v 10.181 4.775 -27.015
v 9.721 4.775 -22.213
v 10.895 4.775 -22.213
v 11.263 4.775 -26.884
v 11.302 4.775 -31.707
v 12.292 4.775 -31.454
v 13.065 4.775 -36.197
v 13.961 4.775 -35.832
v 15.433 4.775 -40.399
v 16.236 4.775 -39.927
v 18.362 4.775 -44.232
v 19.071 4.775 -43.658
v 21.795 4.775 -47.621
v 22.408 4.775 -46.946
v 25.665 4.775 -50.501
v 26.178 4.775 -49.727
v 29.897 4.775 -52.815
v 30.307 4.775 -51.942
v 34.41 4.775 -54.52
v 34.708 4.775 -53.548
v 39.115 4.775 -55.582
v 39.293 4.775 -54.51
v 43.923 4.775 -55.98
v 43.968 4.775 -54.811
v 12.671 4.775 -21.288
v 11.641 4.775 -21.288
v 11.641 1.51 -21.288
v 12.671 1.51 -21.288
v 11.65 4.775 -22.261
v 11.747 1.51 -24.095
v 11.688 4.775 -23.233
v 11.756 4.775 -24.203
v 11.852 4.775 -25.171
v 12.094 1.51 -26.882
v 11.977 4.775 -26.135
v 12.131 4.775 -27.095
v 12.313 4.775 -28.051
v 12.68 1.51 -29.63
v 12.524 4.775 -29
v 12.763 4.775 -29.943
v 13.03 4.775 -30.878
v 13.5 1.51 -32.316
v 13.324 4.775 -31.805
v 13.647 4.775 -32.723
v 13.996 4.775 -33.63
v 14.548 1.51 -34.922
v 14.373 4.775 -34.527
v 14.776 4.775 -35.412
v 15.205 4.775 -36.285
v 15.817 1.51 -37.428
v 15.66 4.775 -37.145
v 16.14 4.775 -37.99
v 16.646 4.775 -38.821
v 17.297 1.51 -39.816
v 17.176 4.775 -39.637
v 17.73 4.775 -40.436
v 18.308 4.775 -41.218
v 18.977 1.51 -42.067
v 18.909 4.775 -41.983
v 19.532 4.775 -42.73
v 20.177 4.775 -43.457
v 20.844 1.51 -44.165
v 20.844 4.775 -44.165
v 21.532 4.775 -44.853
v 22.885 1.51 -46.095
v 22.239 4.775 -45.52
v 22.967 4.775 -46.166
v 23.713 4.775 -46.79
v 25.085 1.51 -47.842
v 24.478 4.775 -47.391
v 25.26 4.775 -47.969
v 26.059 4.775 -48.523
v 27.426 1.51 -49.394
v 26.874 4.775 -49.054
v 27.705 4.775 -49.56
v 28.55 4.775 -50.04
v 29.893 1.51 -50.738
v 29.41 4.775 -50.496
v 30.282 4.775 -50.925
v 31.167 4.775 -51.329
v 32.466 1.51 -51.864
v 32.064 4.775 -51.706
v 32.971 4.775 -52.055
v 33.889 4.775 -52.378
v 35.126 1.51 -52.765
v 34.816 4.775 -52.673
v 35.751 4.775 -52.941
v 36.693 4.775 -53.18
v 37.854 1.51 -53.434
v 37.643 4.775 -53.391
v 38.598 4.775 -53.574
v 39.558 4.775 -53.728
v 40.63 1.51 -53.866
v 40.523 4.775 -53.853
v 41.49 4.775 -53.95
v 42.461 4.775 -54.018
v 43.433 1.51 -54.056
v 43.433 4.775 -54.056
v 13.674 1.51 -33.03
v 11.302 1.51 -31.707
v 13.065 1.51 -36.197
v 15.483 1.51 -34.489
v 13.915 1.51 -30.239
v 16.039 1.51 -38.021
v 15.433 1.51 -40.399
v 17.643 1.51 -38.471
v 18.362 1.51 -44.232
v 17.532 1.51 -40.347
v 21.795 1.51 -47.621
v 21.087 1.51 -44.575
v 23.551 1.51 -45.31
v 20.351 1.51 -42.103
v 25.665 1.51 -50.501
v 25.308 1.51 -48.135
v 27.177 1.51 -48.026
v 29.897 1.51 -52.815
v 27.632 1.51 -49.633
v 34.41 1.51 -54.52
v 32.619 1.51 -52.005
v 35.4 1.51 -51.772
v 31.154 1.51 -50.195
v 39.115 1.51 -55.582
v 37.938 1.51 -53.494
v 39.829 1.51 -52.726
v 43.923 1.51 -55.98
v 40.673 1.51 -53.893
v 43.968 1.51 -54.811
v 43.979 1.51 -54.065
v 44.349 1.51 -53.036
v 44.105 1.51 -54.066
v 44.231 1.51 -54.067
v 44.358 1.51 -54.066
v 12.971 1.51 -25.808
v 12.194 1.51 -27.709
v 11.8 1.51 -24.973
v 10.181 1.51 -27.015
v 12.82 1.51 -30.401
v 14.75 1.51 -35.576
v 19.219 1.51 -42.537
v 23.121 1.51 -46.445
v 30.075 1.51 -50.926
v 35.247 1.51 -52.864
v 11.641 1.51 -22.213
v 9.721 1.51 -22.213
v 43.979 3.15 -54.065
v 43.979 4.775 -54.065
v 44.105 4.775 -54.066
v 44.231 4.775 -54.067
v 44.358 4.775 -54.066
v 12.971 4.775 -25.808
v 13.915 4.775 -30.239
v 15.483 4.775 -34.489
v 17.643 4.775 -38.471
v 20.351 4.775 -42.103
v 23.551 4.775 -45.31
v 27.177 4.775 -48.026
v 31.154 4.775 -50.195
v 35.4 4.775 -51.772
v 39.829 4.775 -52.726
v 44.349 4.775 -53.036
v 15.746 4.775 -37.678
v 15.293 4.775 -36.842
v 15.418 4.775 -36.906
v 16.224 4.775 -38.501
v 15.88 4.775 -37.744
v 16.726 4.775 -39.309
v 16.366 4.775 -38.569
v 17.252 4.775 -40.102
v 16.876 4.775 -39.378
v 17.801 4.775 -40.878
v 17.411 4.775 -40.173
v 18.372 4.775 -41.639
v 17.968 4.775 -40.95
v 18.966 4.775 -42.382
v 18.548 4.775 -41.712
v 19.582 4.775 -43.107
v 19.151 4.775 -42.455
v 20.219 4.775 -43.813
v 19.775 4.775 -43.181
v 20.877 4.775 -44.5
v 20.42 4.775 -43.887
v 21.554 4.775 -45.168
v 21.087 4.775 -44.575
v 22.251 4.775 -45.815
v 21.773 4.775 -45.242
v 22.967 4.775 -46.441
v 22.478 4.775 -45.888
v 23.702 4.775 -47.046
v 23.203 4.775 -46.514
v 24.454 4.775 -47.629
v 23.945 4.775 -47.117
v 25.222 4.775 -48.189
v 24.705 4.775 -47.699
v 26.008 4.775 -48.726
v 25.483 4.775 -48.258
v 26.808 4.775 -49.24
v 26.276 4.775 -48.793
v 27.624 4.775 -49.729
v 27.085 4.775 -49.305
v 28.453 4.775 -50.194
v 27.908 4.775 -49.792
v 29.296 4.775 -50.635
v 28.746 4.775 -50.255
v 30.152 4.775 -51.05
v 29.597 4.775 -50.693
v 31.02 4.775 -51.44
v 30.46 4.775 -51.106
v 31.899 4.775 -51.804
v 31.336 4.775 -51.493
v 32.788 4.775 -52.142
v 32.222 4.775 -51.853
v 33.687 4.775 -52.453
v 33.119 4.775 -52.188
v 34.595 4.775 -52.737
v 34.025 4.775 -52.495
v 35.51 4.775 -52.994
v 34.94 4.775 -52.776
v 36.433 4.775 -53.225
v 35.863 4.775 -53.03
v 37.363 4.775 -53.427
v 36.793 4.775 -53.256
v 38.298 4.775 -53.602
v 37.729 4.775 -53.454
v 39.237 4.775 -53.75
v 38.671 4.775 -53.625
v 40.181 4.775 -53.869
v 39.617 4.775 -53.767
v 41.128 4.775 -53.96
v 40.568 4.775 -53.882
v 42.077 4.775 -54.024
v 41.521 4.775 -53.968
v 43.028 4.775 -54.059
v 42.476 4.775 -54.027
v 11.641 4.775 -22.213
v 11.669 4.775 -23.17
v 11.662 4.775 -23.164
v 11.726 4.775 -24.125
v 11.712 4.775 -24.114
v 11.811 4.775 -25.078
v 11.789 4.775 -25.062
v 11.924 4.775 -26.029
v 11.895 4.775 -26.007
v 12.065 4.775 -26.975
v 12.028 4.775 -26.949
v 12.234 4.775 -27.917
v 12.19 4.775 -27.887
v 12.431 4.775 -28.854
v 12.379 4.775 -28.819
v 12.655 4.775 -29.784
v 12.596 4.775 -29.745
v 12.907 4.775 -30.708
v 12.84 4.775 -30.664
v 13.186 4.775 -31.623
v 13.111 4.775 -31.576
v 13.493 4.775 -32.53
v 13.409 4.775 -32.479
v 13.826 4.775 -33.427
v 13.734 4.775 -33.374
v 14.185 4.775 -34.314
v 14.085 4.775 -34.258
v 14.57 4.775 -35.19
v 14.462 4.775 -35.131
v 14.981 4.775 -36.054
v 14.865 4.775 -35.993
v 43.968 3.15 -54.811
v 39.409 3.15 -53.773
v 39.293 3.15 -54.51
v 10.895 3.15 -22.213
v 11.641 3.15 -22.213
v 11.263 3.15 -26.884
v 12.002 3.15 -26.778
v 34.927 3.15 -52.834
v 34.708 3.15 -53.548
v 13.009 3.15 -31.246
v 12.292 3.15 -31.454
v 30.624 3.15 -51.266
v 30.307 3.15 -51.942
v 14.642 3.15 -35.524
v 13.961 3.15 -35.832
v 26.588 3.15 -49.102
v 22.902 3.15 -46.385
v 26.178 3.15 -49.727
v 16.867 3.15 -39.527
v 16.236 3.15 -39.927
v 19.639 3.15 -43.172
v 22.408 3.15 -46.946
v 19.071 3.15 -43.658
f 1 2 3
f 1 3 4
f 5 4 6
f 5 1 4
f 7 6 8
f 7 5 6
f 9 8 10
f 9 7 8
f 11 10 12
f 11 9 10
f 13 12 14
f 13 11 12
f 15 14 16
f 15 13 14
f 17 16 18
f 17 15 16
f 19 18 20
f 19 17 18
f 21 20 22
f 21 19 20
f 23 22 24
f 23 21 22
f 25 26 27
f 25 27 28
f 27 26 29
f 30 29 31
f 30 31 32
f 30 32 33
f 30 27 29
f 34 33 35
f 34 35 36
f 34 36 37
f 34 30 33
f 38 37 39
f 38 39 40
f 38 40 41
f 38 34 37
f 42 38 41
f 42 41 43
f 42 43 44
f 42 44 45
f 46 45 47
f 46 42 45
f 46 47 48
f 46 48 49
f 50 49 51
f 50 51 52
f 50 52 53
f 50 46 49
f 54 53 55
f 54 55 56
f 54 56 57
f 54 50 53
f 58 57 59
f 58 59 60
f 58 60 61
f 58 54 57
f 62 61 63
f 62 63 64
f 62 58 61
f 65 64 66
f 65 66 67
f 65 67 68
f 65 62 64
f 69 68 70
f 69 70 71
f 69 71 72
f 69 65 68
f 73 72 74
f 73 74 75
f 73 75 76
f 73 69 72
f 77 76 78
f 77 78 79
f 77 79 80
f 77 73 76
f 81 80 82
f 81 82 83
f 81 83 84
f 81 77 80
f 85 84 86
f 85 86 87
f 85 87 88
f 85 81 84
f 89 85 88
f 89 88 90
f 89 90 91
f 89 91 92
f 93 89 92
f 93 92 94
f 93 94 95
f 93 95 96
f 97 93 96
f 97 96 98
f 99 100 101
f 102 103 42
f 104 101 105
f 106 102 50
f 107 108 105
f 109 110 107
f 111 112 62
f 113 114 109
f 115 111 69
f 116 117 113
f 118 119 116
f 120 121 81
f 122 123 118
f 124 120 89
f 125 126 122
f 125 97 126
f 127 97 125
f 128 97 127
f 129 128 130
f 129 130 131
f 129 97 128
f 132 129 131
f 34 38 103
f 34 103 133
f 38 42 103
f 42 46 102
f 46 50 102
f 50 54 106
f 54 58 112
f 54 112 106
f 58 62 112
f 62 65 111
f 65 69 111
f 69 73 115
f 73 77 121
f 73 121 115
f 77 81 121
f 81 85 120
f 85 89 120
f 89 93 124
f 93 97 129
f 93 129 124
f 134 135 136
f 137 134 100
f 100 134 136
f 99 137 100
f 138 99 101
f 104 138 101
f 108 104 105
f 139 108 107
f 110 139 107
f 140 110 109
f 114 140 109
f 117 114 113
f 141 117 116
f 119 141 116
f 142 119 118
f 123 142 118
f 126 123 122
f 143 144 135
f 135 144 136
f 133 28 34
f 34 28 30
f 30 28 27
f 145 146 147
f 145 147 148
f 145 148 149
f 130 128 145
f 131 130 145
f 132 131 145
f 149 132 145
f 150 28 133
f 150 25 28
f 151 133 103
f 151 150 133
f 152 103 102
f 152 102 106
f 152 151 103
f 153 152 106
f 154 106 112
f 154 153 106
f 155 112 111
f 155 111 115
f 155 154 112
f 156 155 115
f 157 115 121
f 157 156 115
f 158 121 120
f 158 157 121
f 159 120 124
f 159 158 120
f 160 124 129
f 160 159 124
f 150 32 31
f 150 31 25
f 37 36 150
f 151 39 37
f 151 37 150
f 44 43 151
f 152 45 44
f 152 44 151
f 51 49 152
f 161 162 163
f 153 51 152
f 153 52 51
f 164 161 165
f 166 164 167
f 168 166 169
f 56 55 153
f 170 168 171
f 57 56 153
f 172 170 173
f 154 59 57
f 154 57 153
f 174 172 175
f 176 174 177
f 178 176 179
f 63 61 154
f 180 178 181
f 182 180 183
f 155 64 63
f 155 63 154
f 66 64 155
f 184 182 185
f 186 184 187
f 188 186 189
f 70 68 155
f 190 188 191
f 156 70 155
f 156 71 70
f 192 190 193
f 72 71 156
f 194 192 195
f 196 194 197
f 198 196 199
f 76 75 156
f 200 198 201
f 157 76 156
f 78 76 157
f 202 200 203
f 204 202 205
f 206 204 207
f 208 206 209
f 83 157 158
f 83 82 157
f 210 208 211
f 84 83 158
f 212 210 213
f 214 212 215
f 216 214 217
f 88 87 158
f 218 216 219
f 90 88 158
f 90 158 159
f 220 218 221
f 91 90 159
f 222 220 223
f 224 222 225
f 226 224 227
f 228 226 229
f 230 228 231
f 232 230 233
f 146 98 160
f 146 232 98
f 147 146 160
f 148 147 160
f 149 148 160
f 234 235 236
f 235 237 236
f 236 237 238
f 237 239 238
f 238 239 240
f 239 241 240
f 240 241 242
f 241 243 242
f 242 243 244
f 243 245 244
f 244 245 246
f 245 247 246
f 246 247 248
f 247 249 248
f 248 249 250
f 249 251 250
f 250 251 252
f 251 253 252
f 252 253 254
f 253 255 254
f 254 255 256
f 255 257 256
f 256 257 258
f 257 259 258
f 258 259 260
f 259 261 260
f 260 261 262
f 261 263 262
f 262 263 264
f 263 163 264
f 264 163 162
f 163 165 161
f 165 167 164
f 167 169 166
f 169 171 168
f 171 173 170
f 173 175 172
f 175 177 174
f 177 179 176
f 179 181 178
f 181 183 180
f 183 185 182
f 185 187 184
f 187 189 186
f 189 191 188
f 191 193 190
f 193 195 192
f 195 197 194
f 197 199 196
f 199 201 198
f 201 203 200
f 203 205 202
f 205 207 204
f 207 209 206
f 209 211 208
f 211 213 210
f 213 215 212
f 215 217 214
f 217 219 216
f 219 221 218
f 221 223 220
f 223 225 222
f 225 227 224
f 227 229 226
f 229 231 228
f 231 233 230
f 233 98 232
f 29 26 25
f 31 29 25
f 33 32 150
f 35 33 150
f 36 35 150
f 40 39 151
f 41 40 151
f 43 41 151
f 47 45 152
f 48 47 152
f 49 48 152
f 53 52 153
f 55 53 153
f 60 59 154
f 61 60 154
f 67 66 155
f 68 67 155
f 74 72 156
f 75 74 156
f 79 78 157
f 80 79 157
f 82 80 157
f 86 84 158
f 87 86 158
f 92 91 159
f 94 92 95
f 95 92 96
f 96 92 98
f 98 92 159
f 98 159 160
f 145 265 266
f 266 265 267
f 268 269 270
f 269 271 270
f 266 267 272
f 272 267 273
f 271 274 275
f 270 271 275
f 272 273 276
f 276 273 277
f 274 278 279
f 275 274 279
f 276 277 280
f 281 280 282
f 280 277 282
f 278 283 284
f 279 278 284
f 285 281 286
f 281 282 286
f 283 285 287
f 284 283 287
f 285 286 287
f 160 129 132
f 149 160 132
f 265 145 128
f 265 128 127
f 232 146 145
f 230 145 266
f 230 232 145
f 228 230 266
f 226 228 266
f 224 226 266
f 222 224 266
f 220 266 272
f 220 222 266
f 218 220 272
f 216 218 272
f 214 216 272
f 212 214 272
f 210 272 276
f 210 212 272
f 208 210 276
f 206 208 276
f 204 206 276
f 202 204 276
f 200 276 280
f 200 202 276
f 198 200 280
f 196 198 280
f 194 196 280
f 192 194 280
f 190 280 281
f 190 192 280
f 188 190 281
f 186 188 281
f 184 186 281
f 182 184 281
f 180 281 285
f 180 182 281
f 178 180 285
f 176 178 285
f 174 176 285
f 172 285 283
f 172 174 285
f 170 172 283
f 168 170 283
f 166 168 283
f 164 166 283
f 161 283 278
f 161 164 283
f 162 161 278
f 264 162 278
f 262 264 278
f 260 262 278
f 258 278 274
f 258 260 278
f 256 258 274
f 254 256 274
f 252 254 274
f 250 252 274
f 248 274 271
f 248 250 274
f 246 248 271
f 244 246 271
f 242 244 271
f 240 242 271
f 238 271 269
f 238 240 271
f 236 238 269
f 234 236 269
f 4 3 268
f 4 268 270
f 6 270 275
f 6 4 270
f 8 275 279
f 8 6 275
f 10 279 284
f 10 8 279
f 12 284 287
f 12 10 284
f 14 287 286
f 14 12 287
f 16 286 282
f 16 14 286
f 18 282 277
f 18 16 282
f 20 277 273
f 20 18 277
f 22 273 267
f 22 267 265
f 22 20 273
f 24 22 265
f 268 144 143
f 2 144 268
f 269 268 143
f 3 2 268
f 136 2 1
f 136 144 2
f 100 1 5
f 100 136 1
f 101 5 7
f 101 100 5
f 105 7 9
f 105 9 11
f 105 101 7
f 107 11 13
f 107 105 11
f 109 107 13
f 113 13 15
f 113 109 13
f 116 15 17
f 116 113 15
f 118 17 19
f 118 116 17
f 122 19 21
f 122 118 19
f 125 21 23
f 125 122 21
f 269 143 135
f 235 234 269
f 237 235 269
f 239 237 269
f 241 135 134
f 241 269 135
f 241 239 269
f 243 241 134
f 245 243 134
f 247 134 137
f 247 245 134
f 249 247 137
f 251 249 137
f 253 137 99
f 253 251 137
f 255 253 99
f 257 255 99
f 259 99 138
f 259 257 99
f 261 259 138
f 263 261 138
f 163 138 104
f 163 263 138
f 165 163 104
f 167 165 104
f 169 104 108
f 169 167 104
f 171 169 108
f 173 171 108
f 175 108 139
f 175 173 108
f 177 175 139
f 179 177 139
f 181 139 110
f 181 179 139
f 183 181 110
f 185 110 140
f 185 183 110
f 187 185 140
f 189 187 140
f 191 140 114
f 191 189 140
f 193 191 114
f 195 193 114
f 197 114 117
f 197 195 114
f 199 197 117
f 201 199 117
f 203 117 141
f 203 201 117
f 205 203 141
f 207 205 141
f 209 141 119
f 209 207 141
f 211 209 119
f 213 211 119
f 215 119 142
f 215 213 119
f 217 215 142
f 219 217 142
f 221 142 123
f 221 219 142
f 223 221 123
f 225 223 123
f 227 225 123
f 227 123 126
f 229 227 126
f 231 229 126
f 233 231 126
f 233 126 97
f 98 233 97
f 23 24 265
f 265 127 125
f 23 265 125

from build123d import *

# Parameters (mm, degrees)
SKETCH1_W          = 2.06
SKETCH1_H          = 6.53
SKETCH3_W          = 1.5
SKETCH3_H          = 6.53
SKETCH6_W          = 2.34
SKETCH6_H          = 6.53
CUT_EXTRUDE1_DEPTH = 3.25
SCALE1_SCALE       = 0.5


with BuildPart() as part:
    # Sweep1: sweep along a path in Sketch2
    with BuildLine(Plane(origin=(0, 0, 0), x_dir=(1, 0, 0), z_dir=(0, 1, 0))) as sweep1_path:
        ThreePointArc((2.06, 0), (20.505721927, 44.951087367), (65.415754098, 63.496542965))
    # Sketch1 → Sweep1 (sweep)
    with BuildSketch(Plane.XY):
        with Locations((1.03, 3.265)):
            Rectangle(SKETCH1_W, SKETCH1_H)
    sweep(path=sweep1_path.line)

    # Sweep2: sweep along a path in Sketch4
    with BuildLine(Plane(origin=(0, 0, 0), x_dir=(1, 0, 0), z_dir=(0, 1, 0))) as sweep2_path:
        ThreePointArc((-2.34, 1.85), (17.612800495, 48.600532533), (64.642950035, 67.885023038))
    # Sketch3 → Sweep2 (sweep)
    with BuildSketch(Plane.XY.offset(-1.85)):
        with Locations((-0.75, 3.265)):
            Rectangle(SKETCH3_W, SKETCH3_H)
    sweep(path=sweep2_path.line)

    # Sweep3: sweep along a path in Sketch7
    with BuildLine(Plane(origin=(0, 6.53, 0), x_dir=(1, 0, 0), z_dir=(0, 1, 0))) as sweep3_path:
        ThreePointArc((-1.5, 1.85), (18.444326424, 47.774036761), (64.654921624, 67.045108351))
    # Sketch6 → Sweep3 (sweep)
    with BuildSketch(Plane.XY.offset(-1.85)):
        with Locations((-2.67, 3.265)):
            Rectangle(SKETCH6_W, SKETCH6_H)
    sweep(path=sweep3_path.line)

    # Sketch8 → Cut-Extrude1 (cut)
    with BuildSketch(Plane(origin=(0, 6.53, 0), x_dir=(1, 0, 0), z_dir=(0, 1, 0))):
        with BuildLine():
            Line((0, 1.85), (-1.4905859, 1.85))
            ThreePointArc((-1.4905859, 1.85), (18.079818822, 48.146737329), (64.654921624, 67.045108351))
            Line((64.654921624, 67.045108351), (64.676165293, 65.554673837))
            ThreePointArc((64.676165293, 65.554673837), (19.144412702, 47.097209332), (0, 1.85))
        make_face()
    extrude(amount=-CUT_EXTRUDE1_DEPTH, mode=Mode.SUBTRACT)


with BuildPart() as part_1:
    # Scale1: scaled about (23.281504141, 3.019990998, -42.576303798)
    add(part.part.scale(SCALE1_SCALE).moved(Location((11.64075207, 1.509995499, -21.288151899))))


solid = part_1.part
